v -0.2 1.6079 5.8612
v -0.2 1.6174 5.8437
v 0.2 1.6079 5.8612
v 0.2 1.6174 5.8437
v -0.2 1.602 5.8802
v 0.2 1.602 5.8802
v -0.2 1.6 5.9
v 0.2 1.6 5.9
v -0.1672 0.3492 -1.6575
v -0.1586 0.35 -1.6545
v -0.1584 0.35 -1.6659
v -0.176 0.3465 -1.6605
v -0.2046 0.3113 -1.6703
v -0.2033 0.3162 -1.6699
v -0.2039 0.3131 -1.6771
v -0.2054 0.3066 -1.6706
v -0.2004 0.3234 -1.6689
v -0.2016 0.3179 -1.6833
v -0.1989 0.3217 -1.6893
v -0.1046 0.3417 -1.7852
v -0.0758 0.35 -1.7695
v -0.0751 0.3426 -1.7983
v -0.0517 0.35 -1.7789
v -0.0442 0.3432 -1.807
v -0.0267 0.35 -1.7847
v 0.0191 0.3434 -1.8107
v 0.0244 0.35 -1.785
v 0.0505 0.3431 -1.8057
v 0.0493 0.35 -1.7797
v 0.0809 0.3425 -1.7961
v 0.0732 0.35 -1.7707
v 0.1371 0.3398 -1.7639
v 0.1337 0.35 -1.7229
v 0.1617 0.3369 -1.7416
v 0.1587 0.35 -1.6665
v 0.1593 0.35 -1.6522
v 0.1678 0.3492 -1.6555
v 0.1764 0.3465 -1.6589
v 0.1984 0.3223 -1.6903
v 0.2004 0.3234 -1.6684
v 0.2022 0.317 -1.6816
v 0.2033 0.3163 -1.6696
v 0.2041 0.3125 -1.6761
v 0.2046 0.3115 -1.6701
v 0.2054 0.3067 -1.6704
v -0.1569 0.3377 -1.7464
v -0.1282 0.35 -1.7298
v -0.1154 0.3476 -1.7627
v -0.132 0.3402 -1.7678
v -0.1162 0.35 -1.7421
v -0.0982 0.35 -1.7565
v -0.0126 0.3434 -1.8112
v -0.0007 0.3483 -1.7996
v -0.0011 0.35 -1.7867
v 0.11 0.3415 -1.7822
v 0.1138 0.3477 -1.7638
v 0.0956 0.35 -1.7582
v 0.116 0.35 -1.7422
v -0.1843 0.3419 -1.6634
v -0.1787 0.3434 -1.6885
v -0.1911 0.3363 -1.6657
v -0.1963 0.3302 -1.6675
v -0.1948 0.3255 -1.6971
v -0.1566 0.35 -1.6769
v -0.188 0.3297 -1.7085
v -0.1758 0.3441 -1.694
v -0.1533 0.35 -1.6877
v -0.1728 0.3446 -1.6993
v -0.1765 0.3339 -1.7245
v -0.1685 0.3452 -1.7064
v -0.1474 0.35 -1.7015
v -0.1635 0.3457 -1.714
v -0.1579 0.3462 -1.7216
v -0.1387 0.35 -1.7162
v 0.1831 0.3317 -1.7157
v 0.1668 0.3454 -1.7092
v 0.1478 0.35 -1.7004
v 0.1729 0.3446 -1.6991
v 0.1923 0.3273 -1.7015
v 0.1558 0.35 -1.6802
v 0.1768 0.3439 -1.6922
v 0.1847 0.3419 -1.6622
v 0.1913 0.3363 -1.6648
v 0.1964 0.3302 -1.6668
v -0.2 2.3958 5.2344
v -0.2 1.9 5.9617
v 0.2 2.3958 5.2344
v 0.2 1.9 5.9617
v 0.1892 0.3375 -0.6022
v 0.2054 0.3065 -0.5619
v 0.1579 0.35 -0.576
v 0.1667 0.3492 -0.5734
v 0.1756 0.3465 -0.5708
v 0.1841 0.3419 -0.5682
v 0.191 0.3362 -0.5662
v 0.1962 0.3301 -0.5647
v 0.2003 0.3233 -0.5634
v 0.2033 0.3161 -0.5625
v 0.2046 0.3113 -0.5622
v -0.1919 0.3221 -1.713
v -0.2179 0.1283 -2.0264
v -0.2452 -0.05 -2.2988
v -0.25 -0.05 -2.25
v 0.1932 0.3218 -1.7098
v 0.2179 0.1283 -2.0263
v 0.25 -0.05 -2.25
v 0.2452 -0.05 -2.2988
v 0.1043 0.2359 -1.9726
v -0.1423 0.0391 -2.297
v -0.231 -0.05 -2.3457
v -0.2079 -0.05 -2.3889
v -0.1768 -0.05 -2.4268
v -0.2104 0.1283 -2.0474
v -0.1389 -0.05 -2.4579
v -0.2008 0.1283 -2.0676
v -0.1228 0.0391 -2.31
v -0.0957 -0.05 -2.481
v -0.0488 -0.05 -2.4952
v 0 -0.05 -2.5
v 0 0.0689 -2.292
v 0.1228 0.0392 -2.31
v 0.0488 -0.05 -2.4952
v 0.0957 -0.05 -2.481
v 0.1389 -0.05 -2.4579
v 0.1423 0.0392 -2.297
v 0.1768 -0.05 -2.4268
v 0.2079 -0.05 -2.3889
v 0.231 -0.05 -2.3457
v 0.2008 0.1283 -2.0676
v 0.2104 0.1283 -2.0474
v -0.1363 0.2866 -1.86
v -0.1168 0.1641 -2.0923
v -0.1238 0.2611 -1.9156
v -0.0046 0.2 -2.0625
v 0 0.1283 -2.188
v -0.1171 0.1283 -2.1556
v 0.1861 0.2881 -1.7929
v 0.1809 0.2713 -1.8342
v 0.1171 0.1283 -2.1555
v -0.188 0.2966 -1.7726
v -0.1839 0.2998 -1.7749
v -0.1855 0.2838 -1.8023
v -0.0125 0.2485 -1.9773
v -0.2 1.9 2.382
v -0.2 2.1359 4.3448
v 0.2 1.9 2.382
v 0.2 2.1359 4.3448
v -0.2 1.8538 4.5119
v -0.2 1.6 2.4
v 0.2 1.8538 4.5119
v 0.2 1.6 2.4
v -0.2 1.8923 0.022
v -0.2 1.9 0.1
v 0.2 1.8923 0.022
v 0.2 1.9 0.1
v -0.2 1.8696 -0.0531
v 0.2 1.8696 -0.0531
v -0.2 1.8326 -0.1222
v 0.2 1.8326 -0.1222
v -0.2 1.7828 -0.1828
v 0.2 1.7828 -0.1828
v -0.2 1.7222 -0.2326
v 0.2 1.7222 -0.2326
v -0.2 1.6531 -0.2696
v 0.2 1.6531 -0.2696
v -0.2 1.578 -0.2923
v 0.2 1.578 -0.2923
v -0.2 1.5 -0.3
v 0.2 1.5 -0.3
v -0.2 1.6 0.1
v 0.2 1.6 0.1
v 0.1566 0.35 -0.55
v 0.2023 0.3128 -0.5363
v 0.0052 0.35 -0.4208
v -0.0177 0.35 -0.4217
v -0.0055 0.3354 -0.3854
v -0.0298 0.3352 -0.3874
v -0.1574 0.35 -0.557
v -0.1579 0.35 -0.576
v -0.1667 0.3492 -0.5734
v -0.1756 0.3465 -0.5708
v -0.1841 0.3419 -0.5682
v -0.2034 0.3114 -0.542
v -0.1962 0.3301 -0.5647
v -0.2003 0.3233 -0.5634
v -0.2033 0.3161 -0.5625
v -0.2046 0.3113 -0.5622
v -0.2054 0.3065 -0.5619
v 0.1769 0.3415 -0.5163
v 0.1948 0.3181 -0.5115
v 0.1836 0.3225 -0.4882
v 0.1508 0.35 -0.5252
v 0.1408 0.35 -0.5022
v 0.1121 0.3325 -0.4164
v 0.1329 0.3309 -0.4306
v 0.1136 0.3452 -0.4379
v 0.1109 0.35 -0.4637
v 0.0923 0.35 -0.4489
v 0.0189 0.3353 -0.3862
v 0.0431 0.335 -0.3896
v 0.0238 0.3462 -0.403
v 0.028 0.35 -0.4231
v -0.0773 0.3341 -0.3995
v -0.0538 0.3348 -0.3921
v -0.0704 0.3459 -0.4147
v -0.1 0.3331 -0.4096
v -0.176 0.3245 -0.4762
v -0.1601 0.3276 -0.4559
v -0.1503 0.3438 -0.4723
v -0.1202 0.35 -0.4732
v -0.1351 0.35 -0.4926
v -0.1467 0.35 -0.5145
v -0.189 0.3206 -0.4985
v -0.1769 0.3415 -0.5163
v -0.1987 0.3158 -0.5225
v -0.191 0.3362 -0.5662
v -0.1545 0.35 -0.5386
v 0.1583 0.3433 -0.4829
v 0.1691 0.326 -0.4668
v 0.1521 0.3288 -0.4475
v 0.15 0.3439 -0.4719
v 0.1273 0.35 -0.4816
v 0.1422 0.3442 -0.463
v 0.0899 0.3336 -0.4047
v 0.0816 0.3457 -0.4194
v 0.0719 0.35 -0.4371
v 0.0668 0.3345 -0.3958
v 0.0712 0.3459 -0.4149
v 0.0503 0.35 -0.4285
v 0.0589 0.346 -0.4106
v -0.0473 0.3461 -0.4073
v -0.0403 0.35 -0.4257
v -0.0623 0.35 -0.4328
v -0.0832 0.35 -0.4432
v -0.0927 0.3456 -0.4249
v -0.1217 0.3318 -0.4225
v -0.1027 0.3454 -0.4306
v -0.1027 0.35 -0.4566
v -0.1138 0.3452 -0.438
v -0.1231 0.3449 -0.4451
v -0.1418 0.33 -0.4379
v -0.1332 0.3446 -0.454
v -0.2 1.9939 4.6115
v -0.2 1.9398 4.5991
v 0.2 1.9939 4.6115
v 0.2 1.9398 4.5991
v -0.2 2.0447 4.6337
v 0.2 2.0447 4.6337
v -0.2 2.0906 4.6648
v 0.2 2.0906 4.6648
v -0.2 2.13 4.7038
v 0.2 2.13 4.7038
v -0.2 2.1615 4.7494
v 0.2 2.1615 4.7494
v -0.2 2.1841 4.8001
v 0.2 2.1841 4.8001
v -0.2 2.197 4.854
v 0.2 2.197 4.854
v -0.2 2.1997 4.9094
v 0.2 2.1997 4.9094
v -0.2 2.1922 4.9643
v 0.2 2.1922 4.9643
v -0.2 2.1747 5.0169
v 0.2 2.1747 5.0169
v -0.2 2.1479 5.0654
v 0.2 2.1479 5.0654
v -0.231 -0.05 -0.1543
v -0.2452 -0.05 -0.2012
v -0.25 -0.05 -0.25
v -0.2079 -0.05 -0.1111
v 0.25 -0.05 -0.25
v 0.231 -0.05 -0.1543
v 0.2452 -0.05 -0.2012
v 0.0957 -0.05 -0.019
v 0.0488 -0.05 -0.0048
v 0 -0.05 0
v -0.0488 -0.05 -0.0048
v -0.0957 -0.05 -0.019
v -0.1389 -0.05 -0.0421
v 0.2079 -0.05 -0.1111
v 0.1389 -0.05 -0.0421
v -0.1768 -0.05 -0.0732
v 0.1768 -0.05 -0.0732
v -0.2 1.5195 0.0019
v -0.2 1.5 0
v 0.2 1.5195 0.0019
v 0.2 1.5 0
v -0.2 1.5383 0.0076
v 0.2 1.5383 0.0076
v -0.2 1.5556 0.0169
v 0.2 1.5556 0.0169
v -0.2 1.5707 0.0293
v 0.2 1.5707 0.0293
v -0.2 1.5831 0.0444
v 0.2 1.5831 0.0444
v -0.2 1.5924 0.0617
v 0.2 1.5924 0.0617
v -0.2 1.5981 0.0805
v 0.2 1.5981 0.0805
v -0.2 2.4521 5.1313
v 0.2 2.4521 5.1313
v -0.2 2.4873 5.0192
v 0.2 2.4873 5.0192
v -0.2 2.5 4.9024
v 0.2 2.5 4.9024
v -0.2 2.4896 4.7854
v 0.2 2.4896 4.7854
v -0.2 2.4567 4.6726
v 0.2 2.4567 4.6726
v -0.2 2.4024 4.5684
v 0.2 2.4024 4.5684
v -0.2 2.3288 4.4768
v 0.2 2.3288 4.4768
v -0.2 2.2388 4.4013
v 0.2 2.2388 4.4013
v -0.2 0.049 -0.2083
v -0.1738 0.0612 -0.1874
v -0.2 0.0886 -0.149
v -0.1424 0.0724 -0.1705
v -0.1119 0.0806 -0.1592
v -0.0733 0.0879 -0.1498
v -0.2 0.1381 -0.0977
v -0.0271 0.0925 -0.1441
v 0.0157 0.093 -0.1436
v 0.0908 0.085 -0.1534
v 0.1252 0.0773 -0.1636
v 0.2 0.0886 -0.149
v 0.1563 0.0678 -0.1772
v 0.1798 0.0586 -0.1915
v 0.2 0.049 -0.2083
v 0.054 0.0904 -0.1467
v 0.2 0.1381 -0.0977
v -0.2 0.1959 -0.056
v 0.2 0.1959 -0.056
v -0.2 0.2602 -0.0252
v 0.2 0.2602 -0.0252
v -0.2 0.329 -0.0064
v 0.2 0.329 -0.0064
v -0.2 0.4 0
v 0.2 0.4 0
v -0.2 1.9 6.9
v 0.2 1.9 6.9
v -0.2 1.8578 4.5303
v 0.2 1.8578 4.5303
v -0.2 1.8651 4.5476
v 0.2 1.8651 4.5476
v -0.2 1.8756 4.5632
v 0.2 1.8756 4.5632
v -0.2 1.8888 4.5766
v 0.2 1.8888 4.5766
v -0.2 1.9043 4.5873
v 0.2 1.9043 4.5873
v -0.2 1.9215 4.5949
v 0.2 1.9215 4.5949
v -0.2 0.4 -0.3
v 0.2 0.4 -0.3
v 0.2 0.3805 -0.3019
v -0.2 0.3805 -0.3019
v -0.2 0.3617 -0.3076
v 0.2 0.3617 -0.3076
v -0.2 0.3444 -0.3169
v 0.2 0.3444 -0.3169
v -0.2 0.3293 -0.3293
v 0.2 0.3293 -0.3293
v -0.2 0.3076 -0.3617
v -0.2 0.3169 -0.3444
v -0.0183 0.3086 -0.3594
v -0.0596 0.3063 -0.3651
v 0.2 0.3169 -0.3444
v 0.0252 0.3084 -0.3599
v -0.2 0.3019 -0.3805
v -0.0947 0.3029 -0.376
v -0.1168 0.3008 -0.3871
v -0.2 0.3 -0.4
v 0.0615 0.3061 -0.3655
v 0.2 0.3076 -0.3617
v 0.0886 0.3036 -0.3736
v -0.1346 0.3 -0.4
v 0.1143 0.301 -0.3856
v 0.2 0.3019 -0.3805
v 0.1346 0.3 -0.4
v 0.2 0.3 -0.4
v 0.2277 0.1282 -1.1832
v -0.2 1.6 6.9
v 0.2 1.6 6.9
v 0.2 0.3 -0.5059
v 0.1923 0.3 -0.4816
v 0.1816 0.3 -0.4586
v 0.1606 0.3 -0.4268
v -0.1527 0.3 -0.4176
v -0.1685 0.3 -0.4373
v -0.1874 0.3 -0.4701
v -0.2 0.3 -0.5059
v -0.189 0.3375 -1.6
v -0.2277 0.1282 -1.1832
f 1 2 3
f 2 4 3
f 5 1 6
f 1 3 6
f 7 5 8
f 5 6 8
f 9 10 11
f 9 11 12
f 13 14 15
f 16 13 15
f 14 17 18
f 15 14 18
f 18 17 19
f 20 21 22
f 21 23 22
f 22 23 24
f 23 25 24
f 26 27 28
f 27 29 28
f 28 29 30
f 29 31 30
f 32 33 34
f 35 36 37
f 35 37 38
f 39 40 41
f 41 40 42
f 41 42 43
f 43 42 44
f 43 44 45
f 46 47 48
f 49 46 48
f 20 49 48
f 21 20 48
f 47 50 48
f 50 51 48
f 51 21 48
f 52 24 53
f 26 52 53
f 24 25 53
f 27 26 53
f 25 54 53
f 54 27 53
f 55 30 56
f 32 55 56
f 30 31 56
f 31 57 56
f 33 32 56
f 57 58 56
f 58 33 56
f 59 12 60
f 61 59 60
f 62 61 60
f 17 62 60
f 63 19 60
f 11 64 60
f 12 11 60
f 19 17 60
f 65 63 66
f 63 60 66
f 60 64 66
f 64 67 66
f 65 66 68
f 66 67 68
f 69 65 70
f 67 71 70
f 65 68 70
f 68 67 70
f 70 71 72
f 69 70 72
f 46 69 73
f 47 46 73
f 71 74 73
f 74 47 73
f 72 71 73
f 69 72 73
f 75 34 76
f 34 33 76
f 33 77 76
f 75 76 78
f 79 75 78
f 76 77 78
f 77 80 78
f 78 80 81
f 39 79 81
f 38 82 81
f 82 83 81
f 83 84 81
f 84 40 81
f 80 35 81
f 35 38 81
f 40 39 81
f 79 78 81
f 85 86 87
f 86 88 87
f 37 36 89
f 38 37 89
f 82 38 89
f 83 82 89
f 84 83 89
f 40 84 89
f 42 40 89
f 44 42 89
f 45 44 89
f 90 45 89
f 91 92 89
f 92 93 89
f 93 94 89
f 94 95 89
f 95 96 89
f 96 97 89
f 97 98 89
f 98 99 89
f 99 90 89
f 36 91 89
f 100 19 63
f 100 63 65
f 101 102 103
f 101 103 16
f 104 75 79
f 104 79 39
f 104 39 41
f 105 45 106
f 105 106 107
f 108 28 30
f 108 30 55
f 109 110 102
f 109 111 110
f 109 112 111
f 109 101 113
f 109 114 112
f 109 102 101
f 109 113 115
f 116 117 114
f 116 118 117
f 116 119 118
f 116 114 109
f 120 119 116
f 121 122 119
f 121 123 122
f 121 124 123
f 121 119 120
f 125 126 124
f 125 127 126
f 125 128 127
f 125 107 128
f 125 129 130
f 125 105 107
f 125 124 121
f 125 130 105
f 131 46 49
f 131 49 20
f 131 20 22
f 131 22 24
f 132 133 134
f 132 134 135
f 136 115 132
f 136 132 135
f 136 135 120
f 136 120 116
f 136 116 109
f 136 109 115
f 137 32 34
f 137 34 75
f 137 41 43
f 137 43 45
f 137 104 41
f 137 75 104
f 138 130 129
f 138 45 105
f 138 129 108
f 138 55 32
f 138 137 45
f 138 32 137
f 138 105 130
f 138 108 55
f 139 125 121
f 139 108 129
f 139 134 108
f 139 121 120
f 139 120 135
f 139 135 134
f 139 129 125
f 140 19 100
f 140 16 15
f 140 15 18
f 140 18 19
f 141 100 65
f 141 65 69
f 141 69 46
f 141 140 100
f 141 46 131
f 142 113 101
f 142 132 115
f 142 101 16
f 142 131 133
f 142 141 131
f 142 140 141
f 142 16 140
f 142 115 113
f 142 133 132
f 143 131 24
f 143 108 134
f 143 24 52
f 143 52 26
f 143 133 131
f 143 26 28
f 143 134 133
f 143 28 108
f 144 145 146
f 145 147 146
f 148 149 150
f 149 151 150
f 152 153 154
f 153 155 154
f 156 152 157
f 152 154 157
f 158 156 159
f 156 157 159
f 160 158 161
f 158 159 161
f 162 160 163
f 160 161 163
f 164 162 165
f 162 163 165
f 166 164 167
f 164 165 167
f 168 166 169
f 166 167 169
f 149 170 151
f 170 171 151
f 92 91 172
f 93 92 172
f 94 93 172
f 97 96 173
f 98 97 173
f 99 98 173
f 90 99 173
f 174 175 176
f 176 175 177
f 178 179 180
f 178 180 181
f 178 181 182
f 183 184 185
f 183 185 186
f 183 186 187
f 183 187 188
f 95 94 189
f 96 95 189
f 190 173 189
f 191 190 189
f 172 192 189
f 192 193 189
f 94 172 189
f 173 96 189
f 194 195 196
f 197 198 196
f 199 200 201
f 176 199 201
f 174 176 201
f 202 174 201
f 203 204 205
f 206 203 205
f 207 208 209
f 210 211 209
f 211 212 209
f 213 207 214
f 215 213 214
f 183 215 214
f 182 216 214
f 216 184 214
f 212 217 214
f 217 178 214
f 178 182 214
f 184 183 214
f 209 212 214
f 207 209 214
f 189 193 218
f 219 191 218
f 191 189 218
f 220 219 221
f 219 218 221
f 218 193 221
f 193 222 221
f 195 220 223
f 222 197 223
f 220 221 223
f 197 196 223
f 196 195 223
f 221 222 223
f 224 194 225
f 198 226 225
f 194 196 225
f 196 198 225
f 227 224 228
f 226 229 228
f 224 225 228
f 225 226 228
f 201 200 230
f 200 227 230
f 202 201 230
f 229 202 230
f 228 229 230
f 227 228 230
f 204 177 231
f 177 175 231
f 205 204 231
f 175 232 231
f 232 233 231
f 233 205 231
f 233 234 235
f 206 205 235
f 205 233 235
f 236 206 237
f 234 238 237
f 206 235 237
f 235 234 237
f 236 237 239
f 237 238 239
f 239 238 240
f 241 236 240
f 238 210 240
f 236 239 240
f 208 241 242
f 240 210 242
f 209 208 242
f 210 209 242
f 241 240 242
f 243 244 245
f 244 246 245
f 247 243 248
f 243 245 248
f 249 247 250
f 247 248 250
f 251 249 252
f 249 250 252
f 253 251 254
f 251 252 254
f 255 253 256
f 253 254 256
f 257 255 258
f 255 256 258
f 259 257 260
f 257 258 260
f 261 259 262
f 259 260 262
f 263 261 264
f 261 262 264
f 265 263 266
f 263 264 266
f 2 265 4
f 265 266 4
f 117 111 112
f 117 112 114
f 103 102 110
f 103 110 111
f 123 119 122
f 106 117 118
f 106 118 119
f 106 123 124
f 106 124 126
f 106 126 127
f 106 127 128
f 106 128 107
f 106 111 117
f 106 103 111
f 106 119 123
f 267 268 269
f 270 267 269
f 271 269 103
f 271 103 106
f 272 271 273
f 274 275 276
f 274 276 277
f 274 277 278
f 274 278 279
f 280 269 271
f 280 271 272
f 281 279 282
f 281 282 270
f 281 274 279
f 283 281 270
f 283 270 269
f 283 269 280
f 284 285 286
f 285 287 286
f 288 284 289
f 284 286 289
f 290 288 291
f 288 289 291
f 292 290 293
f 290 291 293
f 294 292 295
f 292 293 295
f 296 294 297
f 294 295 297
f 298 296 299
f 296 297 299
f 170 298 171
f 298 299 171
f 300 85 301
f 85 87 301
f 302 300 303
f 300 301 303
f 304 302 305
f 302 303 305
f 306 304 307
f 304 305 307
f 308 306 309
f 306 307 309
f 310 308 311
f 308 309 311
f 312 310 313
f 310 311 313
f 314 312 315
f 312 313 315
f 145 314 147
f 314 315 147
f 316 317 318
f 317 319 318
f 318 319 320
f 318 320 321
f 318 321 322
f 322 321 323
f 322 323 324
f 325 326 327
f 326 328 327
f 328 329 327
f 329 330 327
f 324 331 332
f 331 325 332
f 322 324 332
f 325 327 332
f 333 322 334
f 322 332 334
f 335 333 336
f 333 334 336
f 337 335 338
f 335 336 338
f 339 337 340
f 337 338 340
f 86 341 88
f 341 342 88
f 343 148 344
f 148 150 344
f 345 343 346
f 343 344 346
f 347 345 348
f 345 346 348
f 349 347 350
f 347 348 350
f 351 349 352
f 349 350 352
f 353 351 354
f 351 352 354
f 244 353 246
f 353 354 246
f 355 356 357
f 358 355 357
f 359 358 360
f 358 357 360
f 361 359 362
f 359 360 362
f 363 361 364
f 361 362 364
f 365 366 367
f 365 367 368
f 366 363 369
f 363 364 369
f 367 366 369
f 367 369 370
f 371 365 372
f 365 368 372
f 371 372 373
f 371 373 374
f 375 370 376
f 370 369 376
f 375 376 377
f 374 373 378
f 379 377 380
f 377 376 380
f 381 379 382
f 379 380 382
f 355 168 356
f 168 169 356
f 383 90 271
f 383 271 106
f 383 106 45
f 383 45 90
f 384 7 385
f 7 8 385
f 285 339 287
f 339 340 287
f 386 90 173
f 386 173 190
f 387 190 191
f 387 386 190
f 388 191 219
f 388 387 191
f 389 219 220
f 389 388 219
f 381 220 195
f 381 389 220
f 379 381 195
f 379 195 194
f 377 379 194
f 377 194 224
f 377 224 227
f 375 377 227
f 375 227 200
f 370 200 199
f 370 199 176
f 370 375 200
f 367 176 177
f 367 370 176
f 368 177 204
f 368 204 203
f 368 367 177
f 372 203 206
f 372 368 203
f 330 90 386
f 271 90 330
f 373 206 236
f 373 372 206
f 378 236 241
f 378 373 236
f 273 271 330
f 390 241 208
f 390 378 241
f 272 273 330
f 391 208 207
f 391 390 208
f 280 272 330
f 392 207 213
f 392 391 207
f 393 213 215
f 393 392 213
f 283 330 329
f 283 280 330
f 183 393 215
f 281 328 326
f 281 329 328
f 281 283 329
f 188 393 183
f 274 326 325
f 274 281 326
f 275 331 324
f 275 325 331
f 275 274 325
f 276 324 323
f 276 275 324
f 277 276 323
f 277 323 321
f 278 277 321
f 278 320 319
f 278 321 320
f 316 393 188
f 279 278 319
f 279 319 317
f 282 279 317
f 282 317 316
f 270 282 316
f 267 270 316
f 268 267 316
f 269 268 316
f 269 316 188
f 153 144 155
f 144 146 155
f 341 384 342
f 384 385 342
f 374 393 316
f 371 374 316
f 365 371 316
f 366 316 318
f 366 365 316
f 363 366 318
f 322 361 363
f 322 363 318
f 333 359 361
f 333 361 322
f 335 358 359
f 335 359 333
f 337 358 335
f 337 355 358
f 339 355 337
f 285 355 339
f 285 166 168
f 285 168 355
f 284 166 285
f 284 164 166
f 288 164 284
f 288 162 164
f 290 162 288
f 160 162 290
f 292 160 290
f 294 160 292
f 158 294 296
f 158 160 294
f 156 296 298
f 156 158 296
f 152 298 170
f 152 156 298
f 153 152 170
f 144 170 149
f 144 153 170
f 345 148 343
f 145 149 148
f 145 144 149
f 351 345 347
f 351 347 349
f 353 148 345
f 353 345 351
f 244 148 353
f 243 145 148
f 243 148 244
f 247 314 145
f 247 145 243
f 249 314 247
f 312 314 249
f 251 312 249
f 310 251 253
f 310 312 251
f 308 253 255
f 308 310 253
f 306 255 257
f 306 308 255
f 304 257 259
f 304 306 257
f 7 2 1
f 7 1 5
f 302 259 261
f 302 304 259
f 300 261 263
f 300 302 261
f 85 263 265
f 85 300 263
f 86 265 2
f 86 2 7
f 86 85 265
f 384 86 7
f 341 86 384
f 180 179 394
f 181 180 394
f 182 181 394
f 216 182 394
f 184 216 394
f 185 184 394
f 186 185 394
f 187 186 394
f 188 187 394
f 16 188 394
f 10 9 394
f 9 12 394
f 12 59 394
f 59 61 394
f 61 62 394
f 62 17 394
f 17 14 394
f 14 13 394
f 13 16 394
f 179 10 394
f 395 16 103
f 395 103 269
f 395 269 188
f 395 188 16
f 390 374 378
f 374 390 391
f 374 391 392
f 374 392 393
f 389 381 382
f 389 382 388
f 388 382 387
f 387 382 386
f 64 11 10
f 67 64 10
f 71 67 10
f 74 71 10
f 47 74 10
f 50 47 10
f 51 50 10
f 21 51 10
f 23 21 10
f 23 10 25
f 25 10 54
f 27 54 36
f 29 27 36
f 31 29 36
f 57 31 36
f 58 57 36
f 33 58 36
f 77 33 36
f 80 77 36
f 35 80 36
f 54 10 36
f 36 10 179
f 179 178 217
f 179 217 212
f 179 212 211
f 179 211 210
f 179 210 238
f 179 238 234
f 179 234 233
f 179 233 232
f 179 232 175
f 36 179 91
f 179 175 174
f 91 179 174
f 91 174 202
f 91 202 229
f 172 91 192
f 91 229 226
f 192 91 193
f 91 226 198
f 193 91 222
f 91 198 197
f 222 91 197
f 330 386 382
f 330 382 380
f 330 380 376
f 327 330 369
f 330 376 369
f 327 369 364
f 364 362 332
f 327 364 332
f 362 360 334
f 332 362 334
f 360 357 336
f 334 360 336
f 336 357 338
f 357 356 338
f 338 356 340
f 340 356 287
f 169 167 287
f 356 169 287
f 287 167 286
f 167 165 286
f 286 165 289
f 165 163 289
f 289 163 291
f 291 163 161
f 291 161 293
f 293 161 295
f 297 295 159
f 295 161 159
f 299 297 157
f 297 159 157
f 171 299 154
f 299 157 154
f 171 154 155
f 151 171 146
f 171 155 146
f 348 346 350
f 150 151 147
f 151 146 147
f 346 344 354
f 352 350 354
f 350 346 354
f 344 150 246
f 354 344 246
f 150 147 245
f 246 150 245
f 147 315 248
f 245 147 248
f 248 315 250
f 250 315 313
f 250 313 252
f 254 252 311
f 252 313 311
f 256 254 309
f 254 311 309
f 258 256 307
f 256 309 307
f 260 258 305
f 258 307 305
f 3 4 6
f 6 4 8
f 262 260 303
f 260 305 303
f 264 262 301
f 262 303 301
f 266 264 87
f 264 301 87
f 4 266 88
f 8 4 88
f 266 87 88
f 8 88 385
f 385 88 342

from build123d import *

# Parameters (mm, degrees)
EXTRUDE_THIN1_DEPTH = 0.2
FILLET2_R           = 0.05


with BuildPart() as part:
    # Sketch1 → Extrude-Thin1 (new, symmetric)
    with BuildSketch(Plane(origin=(0, 0, 0), x_dir=(0, 0, -1), z_dir=(1, 0, 0))):
        with BuildLine():
            Line((1.5, 0), (0.4, 0))
            ThreePointArc((0.4, 0), (0.117157288, 0.117157288), (0, 0.4))
            Line((0, 0.4), (0, 1.5))
            ThreePointArc((0, 1.5), (-0.029289322, 1.570710678), (-0.1, 1.6))
            Line((-0.1, 1.6), (-2.4, 1.6))
            Line((-2.4, 1.6), (-4.511931163, 1.853790806))
            ThreePointArc((-4.511931163, 1.853790806), (-4.570232229, 1.88189058), (-4.599115742, 1.939807369))
            ThreePointArc((-4.599115742, 1.939807369), (-4.774219375, 2.173964421), (-5.065441937, 2.147883256))
            Line((-5.065441937, 2.147883256), (-5.843673678, 1.617372248))
            ThreePointArc((-5.843673678, 1.617372248), (-5.870527769, 1.604441706), (-5.9, 1.6))
            Line((-5.9, 1.6), (-6.9, 1.6))
            Line((-6.9, 1.6), (-6.9, 1.9))
            Line((-6.9, 1.9), (-5.961684297, 1.9))
            Line((-5.961684297, 1.9), (-5.234420904, 2.395766512))
            ThreePointArc((-5.234420904, 2.395766512), (-4.728210685, 2.475926357), (-4.344765926, 2.135860917))
            Line((-4.344765926, 2.135860917), (-2.382039107, 1.9))
            Line((-2.382039107, 1.9), (-0.1, 1.9))
            ThreePointArc((-0.1, 1.9), (0.182842712, 1.782842712), (0.3, 1.5))
            Line((0.3, 1.5), (0.3, 0.4))
            ThreePointArc((0.3, 0.4), (0.329289322, 0.329289322), (0.4, 0.3))
            Line((0.4, 0.3), (1.5, 0.3))
            Line((1.5, 0.3), (1.5, 0))
        make_face()
    extrude(amount=EXTRUDE_THIN1_DEPTH, both=True)

    # Sketch3 → Loft1 section 0
    with BuildSketch(Plane(origin=(0, 0.35, 0), x_dir=(1, 0, 0), z_dir=(0, 1, 0))):
        with BuildLine():
            Line((0.2, 1.6), (0.2, 0.6))
            ThreePointArc((0.2, 0.6), (0, 0.4), (-0.2, 0.6))
            Line((-0.2, 0.6), (-0.2, 1.6))
            ThreePointArc((-0.2, 1.6), (0, 1.8), (0.2, 1.6))
        make_face()
    # Sketch2 → Loft1 section 1
    with BuildSketch(Plane(origin=(0, -0.05, 0), x_dir=(1, 0, 0), z_dir=(0, 1, 0))):
        with BuildLine():
            Line((0.25, 2.25), (0.25, 0.25))
            ThreePointArc((0.25, 0.25), (0, 0), (-0.25, 0.25))
            Line((-0.25, 0.25), (-0.25, 2.25))
            ThreePointArc((-0.25, 2.25), (0, 2.5), (0.25, 2.25))
        make_face()
    loft()

    # Fillet2
    fillet2_edges = [part.edges().sort_by_distance(p)[0] for p in [
        (0, 0.35, -1.8),
        (-0.2, 0.35, -1.1),
        (0, 0.35, -0.4),
        (0.2, 0.35, -1.1),
    ]]
    fillet(fillet2_edges, radius=FILLET2_R)


solid = part.part
